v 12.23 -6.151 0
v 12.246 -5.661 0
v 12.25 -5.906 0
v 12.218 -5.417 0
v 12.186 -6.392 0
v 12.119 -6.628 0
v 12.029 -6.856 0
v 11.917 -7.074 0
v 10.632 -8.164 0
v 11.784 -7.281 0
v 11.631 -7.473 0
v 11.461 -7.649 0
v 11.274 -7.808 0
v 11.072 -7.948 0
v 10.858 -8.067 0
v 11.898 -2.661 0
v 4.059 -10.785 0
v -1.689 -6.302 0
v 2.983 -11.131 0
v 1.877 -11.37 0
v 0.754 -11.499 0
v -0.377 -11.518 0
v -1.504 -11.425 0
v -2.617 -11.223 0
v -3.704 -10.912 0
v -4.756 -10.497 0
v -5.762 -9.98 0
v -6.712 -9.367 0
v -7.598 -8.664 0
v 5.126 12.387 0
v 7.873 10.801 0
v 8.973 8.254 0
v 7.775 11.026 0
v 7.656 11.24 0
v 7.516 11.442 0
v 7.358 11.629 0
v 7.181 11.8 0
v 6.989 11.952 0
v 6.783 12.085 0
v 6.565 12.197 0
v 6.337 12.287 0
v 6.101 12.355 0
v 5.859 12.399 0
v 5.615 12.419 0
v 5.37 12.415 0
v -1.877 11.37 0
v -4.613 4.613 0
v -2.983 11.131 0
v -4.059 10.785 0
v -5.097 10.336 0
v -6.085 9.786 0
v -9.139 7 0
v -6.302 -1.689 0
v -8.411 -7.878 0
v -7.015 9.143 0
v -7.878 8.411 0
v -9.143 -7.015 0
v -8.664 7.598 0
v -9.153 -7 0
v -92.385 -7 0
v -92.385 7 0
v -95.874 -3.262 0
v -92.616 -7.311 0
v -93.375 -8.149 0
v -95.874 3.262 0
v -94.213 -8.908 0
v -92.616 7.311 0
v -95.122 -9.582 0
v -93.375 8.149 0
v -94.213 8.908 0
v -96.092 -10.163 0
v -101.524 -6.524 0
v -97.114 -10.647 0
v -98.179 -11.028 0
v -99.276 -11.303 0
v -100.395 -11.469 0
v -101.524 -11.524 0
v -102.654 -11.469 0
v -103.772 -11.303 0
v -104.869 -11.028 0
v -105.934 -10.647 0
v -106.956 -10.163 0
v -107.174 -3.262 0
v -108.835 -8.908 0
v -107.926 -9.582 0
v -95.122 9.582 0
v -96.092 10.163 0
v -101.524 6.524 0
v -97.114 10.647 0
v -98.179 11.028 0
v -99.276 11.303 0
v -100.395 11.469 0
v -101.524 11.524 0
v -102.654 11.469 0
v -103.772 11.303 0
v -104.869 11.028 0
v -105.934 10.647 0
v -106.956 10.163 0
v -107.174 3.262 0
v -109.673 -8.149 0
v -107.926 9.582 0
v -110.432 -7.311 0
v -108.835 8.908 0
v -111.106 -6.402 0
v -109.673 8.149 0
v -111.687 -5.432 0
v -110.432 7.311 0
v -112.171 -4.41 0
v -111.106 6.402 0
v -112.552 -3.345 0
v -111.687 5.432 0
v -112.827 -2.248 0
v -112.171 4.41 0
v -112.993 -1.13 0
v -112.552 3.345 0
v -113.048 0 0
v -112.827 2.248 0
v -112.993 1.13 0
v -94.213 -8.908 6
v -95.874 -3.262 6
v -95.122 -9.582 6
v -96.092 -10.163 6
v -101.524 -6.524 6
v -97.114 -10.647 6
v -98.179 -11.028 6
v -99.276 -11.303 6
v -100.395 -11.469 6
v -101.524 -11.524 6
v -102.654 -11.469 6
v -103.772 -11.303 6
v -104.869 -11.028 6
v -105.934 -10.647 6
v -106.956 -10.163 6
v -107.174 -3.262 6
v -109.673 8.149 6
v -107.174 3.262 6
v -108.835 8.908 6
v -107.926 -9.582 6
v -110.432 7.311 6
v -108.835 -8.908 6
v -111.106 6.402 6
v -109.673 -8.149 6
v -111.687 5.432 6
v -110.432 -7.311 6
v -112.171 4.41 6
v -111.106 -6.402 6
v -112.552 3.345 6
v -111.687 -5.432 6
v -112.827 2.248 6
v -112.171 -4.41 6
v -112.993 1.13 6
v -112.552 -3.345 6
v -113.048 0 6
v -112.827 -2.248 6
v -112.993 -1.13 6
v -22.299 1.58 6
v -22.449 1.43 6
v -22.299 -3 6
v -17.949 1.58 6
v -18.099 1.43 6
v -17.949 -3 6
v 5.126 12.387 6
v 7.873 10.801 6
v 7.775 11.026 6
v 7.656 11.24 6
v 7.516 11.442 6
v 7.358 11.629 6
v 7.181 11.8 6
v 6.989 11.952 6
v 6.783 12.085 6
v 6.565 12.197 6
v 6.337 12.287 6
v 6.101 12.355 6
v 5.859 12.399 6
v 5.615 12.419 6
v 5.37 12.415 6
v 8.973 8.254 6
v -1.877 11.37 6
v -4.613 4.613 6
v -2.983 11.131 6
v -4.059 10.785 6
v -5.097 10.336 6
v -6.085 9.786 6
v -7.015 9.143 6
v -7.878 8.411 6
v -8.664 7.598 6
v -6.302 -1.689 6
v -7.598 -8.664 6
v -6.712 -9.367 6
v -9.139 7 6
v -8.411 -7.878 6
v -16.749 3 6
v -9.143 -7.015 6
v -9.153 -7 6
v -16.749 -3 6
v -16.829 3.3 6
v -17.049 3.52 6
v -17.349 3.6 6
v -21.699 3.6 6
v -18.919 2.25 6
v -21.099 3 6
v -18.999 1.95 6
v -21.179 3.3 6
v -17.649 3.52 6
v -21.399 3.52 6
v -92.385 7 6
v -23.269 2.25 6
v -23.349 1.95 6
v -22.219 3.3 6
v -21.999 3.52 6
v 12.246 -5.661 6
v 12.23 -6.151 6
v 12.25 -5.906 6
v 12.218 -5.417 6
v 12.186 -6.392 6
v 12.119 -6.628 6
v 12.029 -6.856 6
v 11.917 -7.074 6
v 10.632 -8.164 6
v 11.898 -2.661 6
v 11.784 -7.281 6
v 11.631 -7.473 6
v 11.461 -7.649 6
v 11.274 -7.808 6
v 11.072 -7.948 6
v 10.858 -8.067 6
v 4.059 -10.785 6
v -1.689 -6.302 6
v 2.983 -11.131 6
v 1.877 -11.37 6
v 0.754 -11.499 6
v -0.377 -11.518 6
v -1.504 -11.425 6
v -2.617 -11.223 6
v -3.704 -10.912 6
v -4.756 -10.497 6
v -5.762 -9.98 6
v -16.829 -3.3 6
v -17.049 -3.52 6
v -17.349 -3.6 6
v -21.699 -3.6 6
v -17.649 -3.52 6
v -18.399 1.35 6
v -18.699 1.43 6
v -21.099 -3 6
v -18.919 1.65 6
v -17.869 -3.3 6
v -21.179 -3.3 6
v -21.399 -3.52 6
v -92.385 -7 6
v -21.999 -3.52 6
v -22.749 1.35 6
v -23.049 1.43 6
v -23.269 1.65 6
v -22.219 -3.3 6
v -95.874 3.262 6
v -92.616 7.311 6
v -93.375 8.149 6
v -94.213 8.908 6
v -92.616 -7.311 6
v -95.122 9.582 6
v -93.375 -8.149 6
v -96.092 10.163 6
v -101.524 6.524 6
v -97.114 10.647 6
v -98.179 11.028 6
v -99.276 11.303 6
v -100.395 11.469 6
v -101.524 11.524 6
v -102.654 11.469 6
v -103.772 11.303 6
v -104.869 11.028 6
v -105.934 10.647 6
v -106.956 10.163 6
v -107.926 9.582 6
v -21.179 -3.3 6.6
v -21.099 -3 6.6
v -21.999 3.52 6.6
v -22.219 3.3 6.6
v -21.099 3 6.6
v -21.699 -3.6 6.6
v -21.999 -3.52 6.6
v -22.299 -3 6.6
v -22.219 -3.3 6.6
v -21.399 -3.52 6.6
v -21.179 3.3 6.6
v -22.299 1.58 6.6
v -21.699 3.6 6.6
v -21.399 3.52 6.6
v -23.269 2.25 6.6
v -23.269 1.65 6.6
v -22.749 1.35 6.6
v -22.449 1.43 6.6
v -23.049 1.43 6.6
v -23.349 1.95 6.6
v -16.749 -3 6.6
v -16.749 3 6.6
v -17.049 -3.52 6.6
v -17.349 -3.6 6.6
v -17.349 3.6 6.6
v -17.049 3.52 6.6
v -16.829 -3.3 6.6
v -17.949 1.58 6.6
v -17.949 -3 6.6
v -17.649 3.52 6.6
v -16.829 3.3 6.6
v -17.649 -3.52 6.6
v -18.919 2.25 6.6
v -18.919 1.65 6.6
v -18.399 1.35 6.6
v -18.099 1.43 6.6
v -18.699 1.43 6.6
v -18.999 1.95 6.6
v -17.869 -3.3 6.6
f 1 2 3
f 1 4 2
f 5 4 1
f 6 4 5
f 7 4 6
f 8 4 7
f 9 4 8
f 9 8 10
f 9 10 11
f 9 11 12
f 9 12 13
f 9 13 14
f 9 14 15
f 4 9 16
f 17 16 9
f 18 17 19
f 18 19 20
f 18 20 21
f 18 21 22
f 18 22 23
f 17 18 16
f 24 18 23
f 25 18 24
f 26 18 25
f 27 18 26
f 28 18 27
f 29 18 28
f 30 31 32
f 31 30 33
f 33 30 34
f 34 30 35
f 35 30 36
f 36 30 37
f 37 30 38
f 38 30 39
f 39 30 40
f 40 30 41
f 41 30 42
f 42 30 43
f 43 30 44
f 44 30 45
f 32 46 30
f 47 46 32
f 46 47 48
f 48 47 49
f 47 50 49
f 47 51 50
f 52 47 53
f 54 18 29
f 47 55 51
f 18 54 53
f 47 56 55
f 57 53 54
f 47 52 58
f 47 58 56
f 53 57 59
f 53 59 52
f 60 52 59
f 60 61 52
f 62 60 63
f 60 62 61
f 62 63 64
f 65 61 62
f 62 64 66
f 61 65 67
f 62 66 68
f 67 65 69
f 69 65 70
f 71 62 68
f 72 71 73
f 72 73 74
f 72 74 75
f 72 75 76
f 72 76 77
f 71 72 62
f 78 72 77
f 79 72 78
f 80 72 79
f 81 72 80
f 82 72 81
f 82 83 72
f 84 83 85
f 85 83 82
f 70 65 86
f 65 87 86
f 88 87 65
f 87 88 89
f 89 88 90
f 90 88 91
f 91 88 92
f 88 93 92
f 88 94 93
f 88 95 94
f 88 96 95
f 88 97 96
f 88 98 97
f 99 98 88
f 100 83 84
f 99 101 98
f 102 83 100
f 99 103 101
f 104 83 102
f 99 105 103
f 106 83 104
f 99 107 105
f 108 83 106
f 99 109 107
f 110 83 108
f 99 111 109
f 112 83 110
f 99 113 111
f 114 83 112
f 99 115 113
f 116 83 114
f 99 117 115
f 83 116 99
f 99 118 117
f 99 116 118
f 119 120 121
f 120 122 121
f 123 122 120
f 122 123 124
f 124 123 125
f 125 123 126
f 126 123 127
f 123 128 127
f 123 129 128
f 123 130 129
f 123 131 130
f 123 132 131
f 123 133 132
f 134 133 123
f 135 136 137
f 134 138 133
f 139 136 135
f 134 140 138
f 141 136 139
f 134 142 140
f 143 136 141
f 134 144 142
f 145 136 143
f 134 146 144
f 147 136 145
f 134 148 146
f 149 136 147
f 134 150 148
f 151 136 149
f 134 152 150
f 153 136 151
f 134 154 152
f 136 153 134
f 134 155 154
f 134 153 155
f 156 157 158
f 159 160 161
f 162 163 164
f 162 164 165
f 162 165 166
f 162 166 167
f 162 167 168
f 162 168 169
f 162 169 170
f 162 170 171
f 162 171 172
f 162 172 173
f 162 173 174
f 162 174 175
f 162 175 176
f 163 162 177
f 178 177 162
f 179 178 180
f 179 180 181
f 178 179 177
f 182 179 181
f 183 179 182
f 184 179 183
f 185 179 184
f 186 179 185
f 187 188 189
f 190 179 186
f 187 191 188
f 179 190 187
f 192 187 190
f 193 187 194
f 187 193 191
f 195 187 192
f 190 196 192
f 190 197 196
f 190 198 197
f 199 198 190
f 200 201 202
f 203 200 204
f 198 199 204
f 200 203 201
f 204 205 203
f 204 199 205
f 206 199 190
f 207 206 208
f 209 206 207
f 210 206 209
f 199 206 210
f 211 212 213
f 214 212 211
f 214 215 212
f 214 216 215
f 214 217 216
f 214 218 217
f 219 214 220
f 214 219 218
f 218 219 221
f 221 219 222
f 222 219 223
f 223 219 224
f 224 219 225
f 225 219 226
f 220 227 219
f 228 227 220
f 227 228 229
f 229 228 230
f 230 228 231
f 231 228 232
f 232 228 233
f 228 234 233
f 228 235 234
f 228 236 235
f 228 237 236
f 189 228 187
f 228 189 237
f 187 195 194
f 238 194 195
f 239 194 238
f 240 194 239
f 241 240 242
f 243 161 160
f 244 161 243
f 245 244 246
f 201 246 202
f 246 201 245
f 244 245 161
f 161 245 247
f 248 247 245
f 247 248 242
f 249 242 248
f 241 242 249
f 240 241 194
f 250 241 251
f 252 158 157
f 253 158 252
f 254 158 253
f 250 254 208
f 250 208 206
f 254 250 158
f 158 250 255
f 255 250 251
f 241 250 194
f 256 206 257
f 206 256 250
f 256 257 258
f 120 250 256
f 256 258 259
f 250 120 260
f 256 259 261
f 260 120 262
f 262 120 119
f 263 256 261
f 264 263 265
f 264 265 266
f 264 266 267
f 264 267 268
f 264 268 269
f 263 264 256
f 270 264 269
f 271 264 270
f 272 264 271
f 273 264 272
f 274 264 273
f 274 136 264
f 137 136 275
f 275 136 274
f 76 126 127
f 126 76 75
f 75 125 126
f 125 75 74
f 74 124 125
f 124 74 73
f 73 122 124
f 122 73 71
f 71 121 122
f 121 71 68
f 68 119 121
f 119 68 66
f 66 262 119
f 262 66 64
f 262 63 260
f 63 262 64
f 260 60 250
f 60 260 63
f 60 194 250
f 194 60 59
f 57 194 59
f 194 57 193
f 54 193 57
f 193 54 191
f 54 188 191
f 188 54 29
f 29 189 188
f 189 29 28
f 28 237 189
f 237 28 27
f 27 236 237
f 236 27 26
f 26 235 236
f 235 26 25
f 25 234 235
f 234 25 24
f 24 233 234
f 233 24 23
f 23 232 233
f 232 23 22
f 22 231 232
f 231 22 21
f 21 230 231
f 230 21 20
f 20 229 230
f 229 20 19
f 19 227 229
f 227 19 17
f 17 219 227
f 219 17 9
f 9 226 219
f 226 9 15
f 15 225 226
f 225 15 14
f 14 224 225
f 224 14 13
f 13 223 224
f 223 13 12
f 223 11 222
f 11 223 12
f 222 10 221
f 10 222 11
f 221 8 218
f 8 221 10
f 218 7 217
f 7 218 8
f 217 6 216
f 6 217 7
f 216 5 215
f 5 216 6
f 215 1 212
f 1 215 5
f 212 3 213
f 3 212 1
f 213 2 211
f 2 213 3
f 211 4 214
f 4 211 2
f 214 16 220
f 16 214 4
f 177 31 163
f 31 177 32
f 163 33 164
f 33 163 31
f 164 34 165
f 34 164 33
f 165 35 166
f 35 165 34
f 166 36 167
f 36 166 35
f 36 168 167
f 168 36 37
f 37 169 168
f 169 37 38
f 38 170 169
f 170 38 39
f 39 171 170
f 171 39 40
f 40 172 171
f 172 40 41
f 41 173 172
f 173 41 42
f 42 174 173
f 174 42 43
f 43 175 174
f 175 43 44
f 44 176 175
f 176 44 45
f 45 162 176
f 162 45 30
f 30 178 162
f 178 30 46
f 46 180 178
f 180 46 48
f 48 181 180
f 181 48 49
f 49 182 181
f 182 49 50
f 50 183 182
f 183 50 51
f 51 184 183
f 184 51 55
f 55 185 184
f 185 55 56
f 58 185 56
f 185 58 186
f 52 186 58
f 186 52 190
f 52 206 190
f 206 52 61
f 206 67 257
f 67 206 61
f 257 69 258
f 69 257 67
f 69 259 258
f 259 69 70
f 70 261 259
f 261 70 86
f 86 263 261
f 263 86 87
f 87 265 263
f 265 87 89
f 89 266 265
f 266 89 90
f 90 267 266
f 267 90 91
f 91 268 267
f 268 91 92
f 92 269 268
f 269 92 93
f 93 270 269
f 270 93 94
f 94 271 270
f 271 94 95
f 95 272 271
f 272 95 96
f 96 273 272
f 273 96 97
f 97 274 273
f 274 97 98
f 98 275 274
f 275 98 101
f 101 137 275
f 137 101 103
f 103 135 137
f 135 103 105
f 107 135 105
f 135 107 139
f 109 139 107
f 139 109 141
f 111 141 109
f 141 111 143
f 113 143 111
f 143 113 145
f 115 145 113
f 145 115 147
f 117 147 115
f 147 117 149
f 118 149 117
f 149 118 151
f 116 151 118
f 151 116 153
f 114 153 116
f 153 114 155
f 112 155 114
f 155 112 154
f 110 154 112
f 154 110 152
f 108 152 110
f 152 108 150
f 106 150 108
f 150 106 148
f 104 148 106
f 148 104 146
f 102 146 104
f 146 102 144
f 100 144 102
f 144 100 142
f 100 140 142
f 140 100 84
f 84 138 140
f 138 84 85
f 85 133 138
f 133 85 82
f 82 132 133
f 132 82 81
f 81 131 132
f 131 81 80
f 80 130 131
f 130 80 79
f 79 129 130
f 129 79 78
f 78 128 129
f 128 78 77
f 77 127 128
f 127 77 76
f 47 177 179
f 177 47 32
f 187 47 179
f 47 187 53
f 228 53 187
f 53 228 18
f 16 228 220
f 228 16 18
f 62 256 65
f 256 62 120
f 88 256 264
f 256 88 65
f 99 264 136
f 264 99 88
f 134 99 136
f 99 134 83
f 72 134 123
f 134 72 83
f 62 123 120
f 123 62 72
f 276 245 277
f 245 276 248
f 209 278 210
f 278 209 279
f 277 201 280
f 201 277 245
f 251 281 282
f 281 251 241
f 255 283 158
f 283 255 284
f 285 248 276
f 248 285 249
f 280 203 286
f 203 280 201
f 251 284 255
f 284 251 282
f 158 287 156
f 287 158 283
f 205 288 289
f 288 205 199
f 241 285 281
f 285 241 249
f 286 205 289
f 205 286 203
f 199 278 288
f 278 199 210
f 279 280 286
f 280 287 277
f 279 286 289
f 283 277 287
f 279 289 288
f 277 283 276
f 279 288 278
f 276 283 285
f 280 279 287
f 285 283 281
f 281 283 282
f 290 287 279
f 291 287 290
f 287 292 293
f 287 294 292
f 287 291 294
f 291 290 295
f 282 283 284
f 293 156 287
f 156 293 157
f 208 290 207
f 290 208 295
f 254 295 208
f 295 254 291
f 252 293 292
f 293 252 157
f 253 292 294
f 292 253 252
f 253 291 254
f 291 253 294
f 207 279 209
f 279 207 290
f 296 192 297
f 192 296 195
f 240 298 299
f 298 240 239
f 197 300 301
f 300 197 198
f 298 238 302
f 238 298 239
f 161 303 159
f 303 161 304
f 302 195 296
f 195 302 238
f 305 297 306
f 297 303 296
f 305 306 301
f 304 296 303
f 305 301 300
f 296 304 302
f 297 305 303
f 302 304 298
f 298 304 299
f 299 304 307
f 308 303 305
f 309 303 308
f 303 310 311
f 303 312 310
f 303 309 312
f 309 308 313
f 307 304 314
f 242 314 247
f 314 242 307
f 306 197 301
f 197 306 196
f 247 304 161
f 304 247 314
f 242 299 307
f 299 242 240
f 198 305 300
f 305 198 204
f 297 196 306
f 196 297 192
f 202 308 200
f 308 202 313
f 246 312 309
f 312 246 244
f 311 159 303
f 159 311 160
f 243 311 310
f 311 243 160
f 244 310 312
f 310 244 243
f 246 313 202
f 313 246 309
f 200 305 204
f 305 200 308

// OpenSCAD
// ================== LLAVES PARA TORNILLOS DE CABEZA HEXAGONAL ==================
// Juego de llaves imprimibles para apretar y aflojar tornillos y tuercas
// hexagonales. Por defecto está pensado para cabezas de 11 mm entre caras y
// 4 mm de alto (los bolts de los soportes), pero todo es paramétrico: medí la
// cabeza con un calibre (distancia entre dos caras opuestas y alto) y cargá
// los valores.
//  · llave_boca: llave fija plana, con boca a 15° como las de taller; puede
//    llevar una segunda boca de otra medida en el otro extremo.
//  · llave_combinada: boca de un lado y anillo (estrella) del otro; el
//    anillo agarra las seis caras y es el que más fuerza soporta.
//  · llave_tubo: tubo con un hexágono en cada extremo (dos medidas) y un
//    agujero transversal para pasar una barra, un destornillador o un bolt.
//  · llave_T: tubo con mango en T, para apretar rápido y con buen par.
//  · destornillador: destornillador de tuercas con empuñadura estriada, el
//    más cómodo para tornillos chicos y lugares estrechos.
//  · barra: barra para la llave de tubo (o usá una varilla o un bolt).
// Todas las piezas salen en posición de impresión: planas o paradas con el
// hexágono hacia arriba, sin soportes. Los hexágonos tienen una boca
// achaflanada para que entren fácil. Si la llave entra floja o forzada,
// ajustá «holgura» (±0,1 mm) y volvé a imprimir.

/* [Qué imprimir] */
// Pieza a renderizar y exportar
pieza = "llave_combinada"; // [llave_boca, llave_combinada, llave_tubo, llave_T, destornillador, barra, todo]

/* [Cabeza del tornillo] */
// Medida entre caras de la cabeza o tuerca (mm)
entre_caras = 11; // [4:0.5:24]
// Alto de la cabeza (mm): profundidad útil del hexágono en las llaves de tubo
alto_cabeza = 4; // [1:0.5:15]
// Holgura del hexágono (mm): sumá 0,1 si entra forzado, restá si queda flojo
holgura = 0.3; // [0:0.05:1]
// Diámetro del agujero para el vástago detrás del hexágono (mm, 0 = ciego): permite usar las llaves de tubo sobre tuercas
diametro_paso = 7; // [0:0.5:16]
// Profundidad de ese agujero (mm)
profundidad_paso = 12; // [0:1:40]

/* [Segunda medida] */
// Medida entre caras del segundo extremo (llave de boca doble y llave de tubo), mm
entre_caras_2 = 10; // [4:0.5:24]
// La llave de boca lleva una segunda boca (con entre_caras_2) en vez de agujero para colgar
segunda_boca = true;

/* [Llaves planas] */
// Espesor de la llave (mm)
espesor = 6; // [3:0.5:12]
// Largo del mango (mm)
largo_mango = 90; // [40:5:160]
// Ancho del mango (mm)
ancho_mango = 14; // [8:1:25]
// Pared alrededor de la boca y del anillo (mm)
pared = 5; // [3:0.5:10]
// Ángulo de la boca respecto del mango (grados)
angulo_boca = 15; // [0:5:30]
// Puntas del anillo: 6 (más fuerte) o 12 (agarra cada 30°)
puntas = 6; // [6, 12]

/* [Llaves de tubo y destornillador] */
// Pared del tubo alrededor del hexágono (mm)
pared_tubo = 3; // [2:0.5:6]
// Largo de la llave de tubo (mm)
largo_tubo = 50; // [30:5:100]
// Diámetro del agujero transversal de la llave de tubo (mm)
diametro_barra = 6; // [3:0.5:12]
// Largo del vástago (llave T y destornillador), mm
largo_vastago = 40; // [15:5:100]
// Largo del mango en T (mm)
largo_T = 70; // [40:5:120]
// Grosor del mango en T (mm)
grosor_T = 10; // [6:1:16]
// Diámetro de la empuñadura del destornillador (mm)
diametro_empunadura = 26; // [18:1:40]
// Largo de la empuñadura (mm)
largo_empunadura = 55; // [30:5:100]
// Cantidad de estrías de la empuñadura
estrias = 8; // [0:1:16]

/* [Rótulo] */
// Grabar la medida en cada llave
rotular = true;

/* [Hidden] */
$fn = 64;
eps = 0.02;
r_hex  = (entre_caras + holgura) / sqrt(3);     // radio de los vértices del hexágono
r_hex2 = (entre_caras_2 + holgura) / sqrt(3);
R_cab  = r_hex + pared;                          // radio exterior de la cabeza de la llave plana
D_tubo = 2 * (r_hex + pared_tubo);               // diámetro exterior del tubo
prof   = alto_cabeza + 0.5;                      // profundidad del hexágono en los tubos
function r_de(af) = (af + holgura) / sqrt(3);
echo(str("Hexágono ", entre_caras, " mm entre caras: radio ", round(r_hex * 100) / 100, " mm; tubo de Ø", round(D_tubo * 10) / 10, " mm"));

// ---- Rótulo de la medida (trazos, sin fuentes) ----
_GL = [
    [[[0.3,0],[0.7,0],[1,0.3],[1,1.7],[0.7,2],[0.3,2],[0,1.7],[0,0.3],[0.3,0]]],       // 0
    [[[0.5,0],[0.5,2]],[[0.15,1.65],[0.5,2]]],                                          // 1
    [[[0,1.7],[0.3,2],[0.7,2],[1,1.7],[1,1.3],[0,0],[1,0]]],                            // 2
    [[[0,2],[1,2],[0.55,1.15],[1,0.75],[1,0.3],[0.7,0],[0.3,0],[0,0.3]]],               // 3
    [[[0.75,0],[0.75,2],[0,0.6],[1,0.6]]],                                              // 4
    [[[1,2],[0,2],[0,1.1],[0.7,1.1],[1,0.8],[1,0.3],[0.7,0],[0,0]]],                    // 5
    [[[1,2],[0.4,2],[0,1.4],[0,0.3],[0.3,0],[0.7,0],[1,0.3],[1,0.8],[0.7,1.05],[0,1.05]]], // 6
    [[[0,2],[1,2],[0.4,0]]],                                                            // 7
    [[[0.5,1.05],[0.2,1.3],[0.2,1.75],[0.5,2],[0.8,1.75],[0.8,1.3],[0.5,1.05],[0.1,0.8],[0.1,0.25],[0.4,0],[0.6,0],[0.9,0.25],[0.9,0.8],[0.5,1.05]]], // 8
    [[[0,0],[0.6,0],[1,0.6],[1,1.7],[0.7,2],[0.3,2],[0,1.7],[0,1.2],[0.3,0.95],[1,0.95]]], // 9
    [[[0.4,0],[0.6,0]]]                                                                 // .
];
function _gi(c) = c == "." ? 10 : search(c, "0123456789", 1)[0];
module rotulo(s, h = 6, g = 1.2, alto = 0.8) {
    k = h / 2; ancho = (len(s) * 1.45 - 0.45) * k;
    translate([-ancho / 2, -h / 2, 0]) for (i = [0 : len(s) - 1]) {
        gi = _gi(s[i]);
        if (gi != undef && gi != [])
            for (p = _GL[gi]) for (j = [0 : len(p) - 2]) hull() {
                translate([(i * 1.45 + p[j][0]) * k, p[j][1] * k, 0]) cylinder(d = g, h = alto, $fn = 12);
                translate([(i * 1.45 + p[j + 1][0]) * k, p[j + 1][1] * k, 0]) cylinder(d = g, h = alto, $fn = 12);
            }
    }
}
function medida(af) = str(af);

// ---- Geometría común ----
// Hexágono (2D) con dos caras paralelas al eje X; con 12 puntas agarra cada 30°
module hex2d(af, p = 6) {
    circle(r = r_de(af), $fn = 6);
    if (p == 12) rotate(30) circle(r = r_de(af), $fn = 6);
}
// Hueco hexagonal 3D con boca achaflanada en z = z_boca (arriba si arriba = true)
module hueco_hex(af, h, z_boca, arriba = true) {
    r = r_de(af);
    translate([0, 0, arriba ? z_boca - h : z_boca]) linear_extrude(h) hex2d(af);
    if (arriba) translate([0, 0, z_boca - 0.8]) cylinder(r1 = r, r2 = r + 0.9, h = 0.8 + eps, $fn = 6);
    else translate([0, 0, z_boca - eps]) cylinder(r1 = r + 0.9, r2 = r, h = 0.8 + eps, $fn = 6);
}
// Agujero para el vástago del tornillo detrás del hexágono
module paso(z_fondo_hex, arriba = true) {
    if (diametro_paso > 0 && profundidad_paso > 0)
        translate([0, 0, arriba ? z_fondo_hex - profundidad_paso : z_fondo_hex - eps]) cylinder(d = diametro_paso, h = profundidad_paso + eps);
}
// Agujero horizontal en gota (se imprime sin soporte), a lo largo de X
module gota_x(d, L) {
    r = d / 2;
    rotate([90, 0, 90]) linear_extrude(L, center = true) { circle(r); polygon([[-r * 0.7071, r * 0.7071], [0, r * 1.4142], [r * 0.7071, r * 0.7071]]); }
}

// ---- Llaves planas ----
// Contorno de la cabeza con boca abierta hacia +X
module cabeza2d(af) {
    r = r_de(af); x_tip = r / 2 + 0.65 * af;
    hull() {
        circle(R_cab);
        for (s = [-1, 1]) translate([x_tip - pared / 2, s * ((af + holgura) / 2 + pared / 2)]) circle(pared / 2);
    }
}
// Hueco de la boca: hexágono más canal hacia +X
module boca2d(af) {
    hex2d(af);
    translate([0, -(af + holgura) / 2]) square([R_cab + 20, af + holgura]);
}
module mango2d(L) {
    hull() { circle(ancho_mango / 2); translate([-L, 0]) circle(ancho_mango / 2); }
}
module grabado_mango(x, s) {
    if (rotular) translate([x, 0, espesor - eps]) rotulo(s, h = min(6, ancho_mango - 5), alto = 0.6 + eps);
}
module llave_boca() {
    L = R_cab + largo_mango;
    union() {
        difference() {
            linear_extrude(espesor) union() {
                rotate(angulo_boca) cabeza2d(entre_caras);
                mango2d(L);
                if (segunda_boca) translate([-L, 0]) rotate(180 + angulo_boca) cabeza2d(entre_caras_2);
            }
            translate([0, 0, -eps]) linear_extrude(espesor + 2 * eps) {
                rotate(angulo_boca) boca2d(entre_caras);
                if (segunda_boca) translate([-L, 0]) rotate(180 + angulo_boca) boca2d(entre_caras_2);
                else translate([-L, 0]) circle(d = 4.5);
            }
        }
        grabado_mango(-(R_cab + 8), medida(entre_caras));
        if (segunda_boca) grabado_mango(-(L - R_cab - 8), medida(entre_caras_2));
    }
}
module llave_combinada() {
    L = R_cab + largo_mango;
    union() {
        difference() {
            linear_extrude(espesor) union() {
                rotate(angulo_boca) cabeza2d(entre_caras);
                mango2d(L);
                translate([-L, 0]) circle(R_cab);
            }
            translate([0, 0, -eps]) linear_extrude(espesor + 2 * eps) {
                rotate(angulo_boca) boca2d(entre_caras);
                translate([-L, 0]) rotate(90) hex2d(entre_caras, puntas);
            }
        }
        grabado_mango(-(R_cab + 8), medida(entre_caras));
    }
}

// ---- Llaves de tubo ----
module llave_tubo() {
    D = 2 * (max(r_hex, r_hex2) + pared_tubo); L = largo_tubo;
    difference() {
        cylinder(d = D, h = L);
        hueco_hex(entre_caras, prof, L, true);
        paso(L - prof, true);
        hueco_hex(entre_caras_2, prof, 0, false);
        paso(prof, false);
        translate([0, 0, L / 2]) gota_x(diametro_barra, D + 2);
        // rótulo grabado en el costado, junto a cada boca
        if (rotular) {
            translate([0, -D / 2 + 0.5, L - prof - 6]) rotate([90, 0, 0]) rotulo(medida(entre_caras), h = 5, alto = 1);
            translate([0, -D / 2 + 0.5, prof + 6]) rotate([90, 0, 0]) rotulo(medida(entre_caras_2), h = 5, alto = 1);
        }
    }
}
module llave_T() {
    t = grosor_T; z_top = t + largo_vastago;
    difference() {
        union() {
            hull() {
                for (s = [-1, 1]) translate([s * (largo_T / 2 - t / 2), 0, 0]) cylinder(d = t, h = t);
                cylinder(d = D_tubo + 6, h = t);
            }
            translate([0, 0, t - eps]) cylinder(d = D_tubo, h = largo_vastago + eps);
        }
        hueco_hex(entre_caras, prof, z_top, true);
        paso(z_top - prof, true);
        if (rotular) translate([0, -D_tubo / 2 + 0.5, z_top - prof - 6]) rotate([90, 0, 0]) rotulo(medida(entre_caras), h = 5, alto = 1);
    }
}
module destornillador() {
    De = diametro_empunadura; Lg = largo_empunadura; z_top = Lg + largo_vastago;
    difference() {
        union() {
            cylinder(d1 = De - 3, d2 = De, h = 1.5);
            translate([0, 0, 1.5 - eps]) cylinder(d = De, h = Lg - 4.5 + 2 * eps);
            translate([0, 0, Lg - 3]) cylinder(d1 = De, d2 = D_tubo + 2, h = 3);
            translate([0, 0, Lg - eps]) cylinder(d = D_tubo, h = largo_vastago + eps);
        }
        if (estrias > 0) for (a = [0 : 360 / estrias : 359]) rotate([0, 0, a])
            translate([De / 2 + 1.3, 0, 4]) cylinder(d = 5, h = Lg - 11);
        hueco_hex(entre_caras, prof, z_top, true);
        paso(z_top - prof, true);
        if (rotular) translate([0, 0, -eps]) mirror([1, 0, 0]) rotulo(medida(entre_caras), h = min(9, De * 0.35), alto = 0.6 + eps);
    }
}
module barra() {
    d = diametro_barra - 0.4;
    intersection() {
        union() {
            translate([0, 0, d / 2 - 0.4]) rotate([0, 90, 0]) cylinder(d = d, h = largo_T, center = true);
            translate([largo_T / 2 - 2, 0, d / 2 - 0.4]) rotate([0, 90, 0]) cylinder(d = d + 4, h = 4, center = true);
        }
        translate([-largo_T, -50, 0]) cube([2 * largo_T, 100, 50]);
    }
}

// ---- Selección ----
module todo() {
    y1 = R_cab + diametro_empunadura / 2 + 8;
    llave_boca();
    translate([0, -(2 * R_cab + 6), 0]) llave_combinada();
    translate([-(largo_mango + R_cab), y1, 0]) destornillador();
    translate([-40, y1, 0]) llave_T();
    translate([diametro_empunadura / 2 + 2, y1, 0]) llave_tubo();
    translate([largo_T / 2 + 10 + diametro_empunadura / 2, y1 + D_tubo / 2 + diametro_barra, 0]) barra();
}
if (pieza == "llave_boca") llave_boca();
else if (pieza == "llave_combinada") llave_combinada();
else if (pieza == "llave_tubo") llave_tubo();
else if (pieza == "llave_T") llave_T();
else if (pieza == "destornillador") destornillador();
else if (pieza == "barra") barra();
else todo();
